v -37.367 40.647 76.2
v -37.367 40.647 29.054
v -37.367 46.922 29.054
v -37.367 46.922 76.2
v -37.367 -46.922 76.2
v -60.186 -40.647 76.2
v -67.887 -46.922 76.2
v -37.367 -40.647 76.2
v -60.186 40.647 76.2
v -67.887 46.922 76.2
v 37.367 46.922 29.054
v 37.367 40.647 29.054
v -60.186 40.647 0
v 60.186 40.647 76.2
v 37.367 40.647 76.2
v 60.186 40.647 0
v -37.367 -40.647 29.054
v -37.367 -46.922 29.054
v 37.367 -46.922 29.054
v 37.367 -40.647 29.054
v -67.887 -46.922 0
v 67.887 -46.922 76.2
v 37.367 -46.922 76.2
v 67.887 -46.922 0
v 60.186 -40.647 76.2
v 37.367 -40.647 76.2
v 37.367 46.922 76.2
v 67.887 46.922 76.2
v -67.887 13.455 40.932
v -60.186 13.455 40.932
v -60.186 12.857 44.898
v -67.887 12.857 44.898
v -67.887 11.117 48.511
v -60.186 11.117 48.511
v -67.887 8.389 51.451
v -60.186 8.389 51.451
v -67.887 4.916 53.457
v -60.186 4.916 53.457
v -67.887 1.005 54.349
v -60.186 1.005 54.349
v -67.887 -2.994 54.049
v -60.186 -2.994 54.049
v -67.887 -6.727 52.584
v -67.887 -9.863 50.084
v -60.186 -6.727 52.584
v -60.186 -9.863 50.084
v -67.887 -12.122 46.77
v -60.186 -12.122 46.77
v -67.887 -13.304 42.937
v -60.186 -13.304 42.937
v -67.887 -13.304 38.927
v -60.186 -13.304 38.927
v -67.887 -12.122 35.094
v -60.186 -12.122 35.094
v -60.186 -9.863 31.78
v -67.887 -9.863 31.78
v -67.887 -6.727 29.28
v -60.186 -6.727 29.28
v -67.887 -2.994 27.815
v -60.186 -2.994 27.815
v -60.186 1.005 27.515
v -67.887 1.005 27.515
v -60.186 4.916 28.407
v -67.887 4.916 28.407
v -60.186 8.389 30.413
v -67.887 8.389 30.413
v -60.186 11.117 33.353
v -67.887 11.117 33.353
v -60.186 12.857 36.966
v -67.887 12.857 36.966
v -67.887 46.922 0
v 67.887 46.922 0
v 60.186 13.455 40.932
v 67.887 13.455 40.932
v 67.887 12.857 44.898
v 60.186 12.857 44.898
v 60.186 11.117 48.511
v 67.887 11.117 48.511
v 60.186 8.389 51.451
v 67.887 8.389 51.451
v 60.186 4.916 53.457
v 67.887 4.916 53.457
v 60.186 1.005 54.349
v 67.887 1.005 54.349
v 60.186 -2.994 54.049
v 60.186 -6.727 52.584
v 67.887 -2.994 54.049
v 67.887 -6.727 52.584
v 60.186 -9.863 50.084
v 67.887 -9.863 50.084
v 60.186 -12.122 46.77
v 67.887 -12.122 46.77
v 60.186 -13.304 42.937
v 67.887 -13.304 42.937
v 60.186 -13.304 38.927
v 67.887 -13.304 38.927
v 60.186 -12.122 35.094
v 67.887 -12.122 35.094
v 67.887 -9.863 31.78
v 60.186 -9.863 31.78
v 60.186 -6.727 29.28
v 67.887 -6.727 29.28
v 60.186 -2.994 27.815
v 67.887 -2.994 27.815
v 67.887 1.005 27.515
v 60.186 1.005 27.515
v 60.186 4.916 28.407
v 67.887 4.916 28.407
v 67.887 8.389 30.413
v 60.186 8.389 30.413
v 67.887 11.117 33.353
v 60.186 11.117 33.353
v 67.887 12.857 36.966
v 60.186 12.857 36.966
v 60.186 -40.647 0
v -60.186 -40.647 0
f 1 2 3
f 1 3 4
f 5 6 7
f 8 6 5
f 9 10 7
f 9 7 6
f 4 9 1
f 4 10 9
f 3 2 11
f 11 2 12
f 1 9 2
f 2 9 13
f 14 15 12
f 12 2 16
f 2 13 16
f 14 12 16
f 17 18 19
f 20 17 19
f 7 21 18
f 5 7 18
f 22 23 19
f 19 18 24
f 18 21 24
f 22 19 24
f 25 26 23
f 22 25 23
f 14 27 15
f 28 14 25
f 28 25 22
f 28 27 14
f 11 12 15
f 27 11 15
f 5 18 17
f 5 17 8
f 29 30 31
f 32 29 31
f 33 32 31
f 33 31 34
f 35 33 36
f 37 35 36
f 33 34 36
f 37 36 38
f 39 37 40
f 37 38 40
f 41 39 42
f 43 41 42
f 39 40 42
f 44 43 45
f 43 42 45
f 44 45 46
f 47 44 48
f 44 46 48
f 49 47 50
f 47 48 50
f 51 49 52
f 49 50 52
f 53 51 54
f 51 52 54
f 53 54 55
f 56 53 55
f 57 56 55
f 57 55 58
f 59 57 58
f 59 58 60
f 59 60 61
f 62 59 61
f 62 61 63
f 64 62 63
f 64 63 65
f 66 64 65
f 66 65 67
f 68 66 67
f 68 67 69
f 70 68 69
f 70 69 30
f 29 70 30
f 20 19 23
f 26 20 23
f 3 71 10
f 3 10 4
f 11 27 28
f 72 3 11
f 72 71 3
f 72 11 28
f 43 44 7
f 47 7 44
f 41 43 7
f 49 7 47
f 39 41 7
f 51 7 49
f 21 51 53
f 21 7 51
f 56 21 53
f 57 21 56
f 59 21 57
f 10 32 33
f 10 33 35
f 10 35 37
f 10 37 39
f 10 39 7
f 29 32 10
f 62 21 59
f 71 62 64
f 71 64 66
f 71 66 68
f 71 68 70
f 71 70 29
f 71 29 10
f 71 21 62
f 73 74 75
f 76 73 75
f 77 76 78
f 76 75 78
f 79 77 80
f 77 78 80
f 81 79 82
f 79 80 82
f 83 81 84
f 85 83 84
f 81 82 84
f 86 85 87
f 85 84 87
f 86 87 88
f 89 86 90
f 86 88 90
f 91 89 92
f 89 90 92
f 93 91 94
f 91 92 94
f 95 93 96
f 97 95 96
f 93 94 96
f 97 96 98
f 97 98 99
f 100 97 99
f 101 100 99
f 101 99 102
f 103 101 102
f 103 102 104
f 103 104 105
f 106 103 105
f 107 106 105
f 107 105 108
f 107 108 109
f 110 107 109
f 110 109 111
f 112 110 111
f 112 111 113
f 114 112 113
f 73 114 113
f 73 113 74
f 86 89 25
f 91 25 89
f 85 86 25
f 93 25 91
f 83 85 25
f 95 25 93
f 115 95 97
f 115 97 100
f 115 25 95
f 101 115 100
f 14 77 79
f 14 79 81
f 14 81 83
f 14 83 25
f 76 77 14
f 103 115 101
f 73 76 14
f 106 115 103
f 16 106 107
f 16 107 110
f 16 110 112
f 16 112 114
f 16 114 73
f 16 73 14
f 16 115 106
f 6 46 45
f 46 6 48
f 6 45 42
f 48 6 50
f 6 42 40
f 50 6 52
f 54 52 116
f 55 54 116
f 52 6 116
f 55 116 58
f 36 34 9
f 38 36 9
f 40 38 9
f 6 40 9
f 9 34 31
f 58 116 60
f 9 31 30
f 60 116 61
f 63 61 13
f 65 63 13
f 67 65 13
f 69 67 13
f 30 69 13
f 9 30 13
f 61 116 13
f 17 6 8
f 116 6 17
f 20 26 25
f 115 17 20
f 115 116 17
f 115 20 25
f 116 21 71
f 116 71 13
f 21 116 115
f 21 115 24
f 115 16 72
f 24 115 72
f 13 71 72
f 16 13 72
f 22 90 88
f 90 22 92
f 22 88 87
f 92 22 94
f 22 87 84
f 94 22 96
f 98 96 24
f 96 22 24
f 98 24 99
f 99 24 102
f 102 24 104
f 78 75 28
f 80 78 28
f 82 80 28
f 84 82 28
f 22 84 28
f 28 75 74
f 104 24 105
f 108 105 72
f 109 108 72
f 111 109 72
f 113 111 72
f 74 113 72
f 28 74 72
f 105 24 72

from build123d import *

# Parameters (mm, degrees)
F0_W     = 135.774552
F0_H     = 93.844176
F0_W_2   = 120.37155
F0_H_2   = 81.29359
F1_DEPTH = 76.2
F2_R     = 13.454778
F3_DEPTH = 135.775553
F4_W     = 74.733056
F4_H     = 47.146207
F5_DEPTH = 93.845175


with BuildPart() as f1:
    # F0 (on Top) → F1 (new body)
    with BuildSketch(Plane.XY):
        Rectangle(F0_W, F0_H)
        Rectangle(F0_W_2, F0_H_2, mode=Mode.SUBTRACT)
    extrude(amount=F1_DEPTH)

    # F2 (on face) → F3 (cut, through all)
    with BuildSketch(Plane.YZ.offset(67.887276)):
        with Locations((0, 40.932029)):
            Circle(F2_R)
    extrude(amount=-F3_DEPTH, mode=Mode.SUBTRACT)

    # F4 (on face) → F5 (cut, through all)
    with BuildSketch(Plane.XZ.offset(46.922088)):
        with Locations((0, 52.626897)):
            Rectangle(F4_W, F4_H)
    extrude(amount=-F5_DEPTH, mode=Mode.SUBTRACT)


solid = f1.part
